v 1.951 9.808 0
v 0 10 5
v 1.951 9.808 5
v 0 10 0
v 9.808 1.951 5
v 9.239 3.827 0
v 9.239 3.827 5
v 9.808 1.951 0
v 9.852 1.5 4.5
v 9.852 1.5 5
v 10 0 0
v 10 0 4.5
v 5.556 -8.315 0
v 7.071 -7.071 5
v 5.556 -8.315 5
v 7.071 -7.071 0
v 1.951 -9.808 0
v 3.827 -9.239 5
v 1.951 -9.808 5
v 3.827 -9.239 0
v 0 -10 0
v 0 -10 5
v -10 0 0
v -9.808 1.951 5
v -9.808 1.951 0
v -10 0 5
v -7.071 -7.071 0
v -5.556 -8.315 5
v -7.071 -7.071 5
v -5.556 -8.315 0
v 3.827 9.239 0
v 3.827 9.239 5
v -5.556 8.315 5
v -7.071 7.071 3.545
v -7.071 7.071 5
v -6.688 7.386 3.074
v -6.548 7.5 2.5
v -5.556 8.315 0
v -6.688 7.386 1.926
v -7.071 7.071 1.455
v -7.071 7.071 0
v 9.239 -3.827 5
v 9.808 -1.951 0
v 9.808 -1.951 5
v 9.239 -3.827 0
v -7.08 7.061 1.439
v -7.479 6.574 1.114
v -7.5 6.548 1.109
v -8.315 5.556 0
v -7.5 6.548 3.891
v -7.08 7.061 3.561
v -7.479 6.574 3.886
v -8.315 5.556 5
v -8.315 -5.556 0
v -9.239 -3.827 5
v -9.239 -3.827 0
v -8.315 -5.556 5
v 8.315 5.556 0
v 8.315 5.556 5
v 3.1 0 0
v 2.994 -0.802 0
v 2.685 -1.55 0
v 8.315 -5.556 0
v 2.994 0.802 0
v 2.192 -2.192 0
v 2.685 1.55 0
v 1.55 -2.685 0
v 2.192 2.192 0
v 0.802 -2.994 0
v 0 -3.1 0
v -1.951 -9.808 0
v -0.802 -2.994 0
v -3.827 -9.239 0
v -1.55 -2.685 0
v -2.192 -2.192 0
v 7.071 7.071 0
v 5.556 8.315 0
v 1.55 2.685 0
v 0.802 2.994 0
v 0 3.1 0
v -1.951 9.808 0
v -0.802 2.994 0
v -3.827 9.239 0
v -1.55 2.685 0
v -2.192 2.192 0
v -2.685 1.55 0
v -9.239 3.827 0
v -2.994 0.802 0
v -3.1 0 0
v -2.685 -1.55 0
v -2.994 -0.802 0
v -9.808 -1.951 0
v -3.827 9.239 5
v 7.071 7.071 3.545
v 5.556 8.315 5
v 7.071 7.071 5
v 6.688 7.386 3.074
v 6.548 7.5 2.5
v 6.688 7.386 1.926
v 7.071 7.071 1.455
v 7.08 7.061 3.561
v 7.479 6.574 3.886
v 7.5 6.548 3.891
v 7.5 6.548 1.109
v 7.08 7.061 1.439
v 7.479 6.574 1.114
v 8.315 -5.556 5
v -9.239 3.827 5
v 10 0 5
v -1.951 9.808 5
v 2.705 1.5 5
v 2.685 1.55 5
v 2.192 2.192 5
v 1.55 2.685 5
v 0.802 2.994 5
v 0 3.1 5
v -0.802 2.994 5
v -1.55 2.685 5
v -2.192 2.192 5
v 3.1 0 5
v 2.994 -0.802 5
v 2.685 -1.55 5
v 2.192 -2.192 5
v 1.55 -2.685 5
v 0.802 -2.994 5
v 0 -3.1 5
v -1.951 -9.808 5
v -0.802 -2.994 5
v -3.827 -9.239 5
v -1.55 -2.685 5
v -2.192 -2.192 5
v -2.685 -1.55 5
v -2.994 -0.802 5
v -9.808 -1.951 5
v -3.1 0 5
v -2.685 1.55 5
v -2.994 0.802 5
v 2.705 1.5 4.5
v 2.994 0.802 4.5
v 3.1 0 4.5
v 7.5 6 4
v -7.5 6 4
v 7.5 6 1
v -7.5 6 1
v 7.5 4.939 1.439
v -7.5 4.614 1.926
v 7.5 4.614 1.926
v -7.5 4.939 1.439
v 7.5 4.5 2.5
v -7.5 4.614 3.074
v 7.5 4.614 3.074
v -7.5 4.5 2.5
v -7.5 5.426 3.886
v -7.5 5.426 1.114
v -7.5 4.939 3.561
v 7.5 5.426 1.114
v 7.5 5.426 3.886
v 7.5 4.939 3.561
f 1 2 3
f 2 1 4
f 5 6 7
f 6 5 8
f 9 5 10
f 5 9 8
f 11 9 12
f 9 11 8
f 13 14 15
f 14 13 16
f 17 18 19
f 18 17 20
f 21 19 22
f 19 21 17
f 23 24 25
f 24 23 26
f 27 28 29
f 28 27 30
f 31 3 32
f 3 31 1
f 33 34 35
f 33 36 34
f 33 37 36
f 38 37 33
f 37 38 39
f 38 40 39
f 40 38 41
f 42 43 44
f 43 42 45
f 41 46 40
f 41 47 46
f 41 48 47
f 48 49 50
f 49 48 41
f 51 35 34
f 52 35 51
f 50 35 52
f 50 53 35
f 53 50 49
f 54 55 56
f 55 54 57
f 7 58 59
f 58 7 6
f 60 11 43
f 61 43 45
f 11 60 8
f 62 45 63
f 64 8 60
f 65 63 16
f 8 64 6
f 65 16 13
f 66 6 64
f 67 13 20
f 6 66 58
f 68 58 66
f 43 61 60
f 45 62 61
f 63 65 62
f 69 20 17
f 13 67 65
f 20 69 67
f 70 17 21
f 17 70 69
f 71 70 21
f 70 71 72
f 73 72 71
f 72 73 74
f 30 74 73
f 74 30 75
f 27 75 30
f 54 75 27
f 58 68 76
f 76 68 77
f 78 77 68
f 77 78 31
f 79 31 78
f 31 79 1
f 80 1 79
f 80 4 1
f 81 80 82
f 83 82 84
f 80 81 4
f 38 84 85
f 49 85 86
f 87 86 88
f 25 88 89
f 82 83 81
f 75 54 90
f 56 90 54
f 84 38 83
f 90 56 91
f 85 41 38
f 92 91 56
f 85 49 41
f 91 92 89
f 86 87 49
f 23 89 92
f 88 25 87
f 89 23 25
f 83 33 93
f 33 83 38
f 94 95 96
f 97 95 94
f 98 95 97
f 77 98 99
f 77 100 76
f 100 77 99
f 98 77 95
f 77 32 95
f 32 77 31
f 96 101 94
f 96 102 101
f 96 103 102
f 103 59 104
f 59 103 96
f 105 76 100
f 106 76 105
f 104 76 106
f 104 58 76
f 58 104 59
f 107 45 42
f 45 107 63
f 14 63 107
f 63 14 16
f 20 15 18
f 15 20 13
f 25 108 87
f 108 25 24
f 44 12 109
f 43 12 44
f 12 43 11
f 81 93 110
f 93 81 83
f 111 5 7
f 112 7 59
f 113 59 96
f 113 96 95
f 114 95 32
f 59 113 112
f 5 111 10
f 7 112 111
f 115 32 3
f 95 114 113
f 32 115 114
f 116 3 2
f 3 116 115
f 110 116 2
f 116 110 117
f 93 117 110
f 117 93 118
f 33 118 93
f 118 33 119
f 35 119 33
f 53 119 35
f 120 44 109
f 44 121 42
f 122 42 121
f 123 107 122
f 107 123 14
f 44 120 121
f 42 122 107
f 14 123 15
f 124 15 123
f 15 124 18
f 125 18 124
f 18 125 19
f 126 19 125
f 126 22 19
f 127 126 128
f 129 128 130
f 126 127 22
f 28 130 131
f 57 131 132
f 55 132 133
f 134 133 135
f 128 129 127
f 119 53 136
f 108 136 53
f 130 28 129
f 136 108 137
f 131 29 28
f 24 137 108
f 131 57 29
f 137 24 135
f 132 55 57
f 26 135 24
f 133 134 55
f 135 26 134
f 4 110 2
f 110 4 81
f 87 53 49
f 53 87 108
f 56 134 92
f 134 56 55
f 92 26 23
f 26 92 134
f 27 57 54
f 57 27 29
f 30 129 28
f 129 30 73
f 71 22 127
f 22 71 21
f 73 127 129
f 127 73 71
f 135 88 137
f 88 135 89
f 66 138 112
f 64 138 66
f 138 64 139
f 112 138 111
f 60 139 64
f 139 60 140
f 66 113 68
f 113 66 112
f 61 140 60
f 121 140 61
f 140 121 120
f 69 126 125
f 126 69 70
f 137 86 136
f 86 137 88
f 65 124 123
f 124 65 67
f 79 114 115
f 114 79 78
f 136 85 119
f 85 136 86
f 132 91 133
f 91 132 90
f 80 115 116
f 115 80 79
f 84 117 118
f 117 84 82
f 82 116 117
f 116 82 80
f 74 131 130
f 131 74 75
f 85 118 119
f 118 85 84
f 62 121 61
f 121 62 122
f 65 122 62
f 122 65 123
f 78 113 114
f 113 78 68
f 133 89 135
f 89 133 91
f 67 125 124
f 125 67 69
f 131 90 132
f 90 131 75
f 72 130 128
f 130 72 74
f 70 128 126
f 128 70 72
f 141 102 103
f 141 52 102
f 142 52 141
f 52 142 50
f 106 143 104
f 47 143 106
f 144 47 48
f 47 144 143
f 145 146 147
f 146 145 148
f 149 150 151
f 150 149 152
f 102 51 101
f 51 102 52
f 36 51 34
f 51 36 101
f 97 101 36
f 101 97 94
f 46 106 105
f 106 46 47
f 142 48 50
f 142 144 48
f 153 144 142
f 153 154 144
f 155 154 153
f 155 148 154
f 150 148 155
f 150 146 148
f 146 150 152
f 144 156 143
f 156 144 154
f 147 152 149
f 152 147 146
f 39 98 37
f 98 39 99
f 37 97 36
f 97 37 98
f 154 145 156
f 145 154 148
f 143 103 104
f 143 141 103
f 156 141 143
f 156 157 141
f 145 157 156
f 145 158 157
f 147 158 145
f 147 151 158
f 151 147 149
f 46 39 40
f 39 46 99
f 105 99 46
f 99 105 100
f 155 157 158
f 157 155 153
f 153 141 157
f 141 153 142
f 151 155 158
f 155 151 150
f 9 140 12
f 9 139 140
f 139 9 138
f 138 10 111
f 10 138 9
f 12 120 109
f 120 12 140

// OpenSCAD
// Simple Cam-Lock Sliding Lid Box for MG996R Servo
// SafeCrackerArduino Reaction Time Game
// No gravity assist - pure cam mechanism

// MG996R dimensions
servo_length = 40;
servo_width = 20;
servo_height = 40.5;
servo_mount_width = 55;

// Box parameters
wall = 2.5;
clearance = 0.5;
base_thickness = 3;
size_increase = 1.1; // 10% increase factor

// Sliding mechanism
slide_groove_depth = 2;
slide_groove_width = 3;
lid_thickness = 3;

// Cam parameters - REDUCED SIZE
cam_diameter = 20;        // Reduced from 30 to 20mm
cam_thickness = 5;
cam_flat_width = 12;      // Reduced flat width proportionally

// Calculate box dimensions with 10% increase
box_inner_l = (servo_length + 2 * clearance) * size_increase;
box_inner_w = (servo_mount_width + 2 * clearance) * size_increase;
box_inner_h = (servo_height + clearance) * size_increase;
box_outer_l = box_inner_l + 2 * wall;
box_outer_w = box_inner_w + 2 * wall;
box_outer_h = box_inner_h + base_thickness;

// Main box - NO SERVO MOUNTS
module box() {
    difference() {
        // Outer shell
        cube([box_outer_l, box_outer_w, box_outer_h]);
        
        // Inner cavity - clean empty space for servo
        translate([wall, wall, base_thickness])
            cube([box_inner_l, box_inner_w, box_inner_h + 10]);
        
        // Servo shaft hole - large for easy assembly
        translate([box_outer_l/2, box_outer_w/2, -1])
            cylinder(h=base_thickness + 2, d=12, $fn=24);
        
        // Cable exit
        translate([box_outer_l - wall - 1, box_outer_w/2 - 5, base_thickness + 15])
            cube([wall + 2, 10, 10]);
        
        // Slide grooves for lid
        groove_height = box_outer_h - 8;
        // Left groove
        translate([-1, wall - slide_groove_width/2, groove_height])
            cube([box_outer_l + 2, slide_groove_width, slide_groove_depth + 1]);
        // Right groove
        translate([-1, box_outer_w - wall - slide_groove_width/2, groove_height])
            cube([box_outer_l + 2, slide_groove_width, slide_groove_depth + 1]);
        
        // Front opening for lid
        translate([-1, wall - slide_groove_width/2, groove_height])
            cube([wall + 2, box_inner_w + slide_groove_width + 1, 10]);
        
        // Mounting holes
        for(x=[8, box_outer_l - 8]) {
            for(y=[8, box_outer_w - 8]) {
                translate([x, y, -1]) {
                    cylinder(h=base_thickness + 2, d=3.2, $fn=16);
                    // Countersink
                    cylinder(h=2, d1=6, d2=3.2, $fn=16);
                }
            }
        }
    }
    
    // NO SERVO MOUNTS - servo sits freely in cavity
}

// Simple sliding lid
module sliding_lid() {
    lid_length = box_outer_l - wall - 0.5;
    lid_width = box_inner_w - 0.5;
    
    difference() {
        union() {
            // Main lid panel
            cube([lid_length, lid_width, lid_thickness]);
            
            // Slide rails
            rail_thickness = slide_groove_width - 0.3;
            rail_height = slide_groove_depth - 0.2;
            
            // Left rail
            translate([0, -rail_thickness/2 + 0.1, lid_thickness])
                cube([lid_length - 5, rail_thickness, rail_height]);
            // Right rail
            translate([0, lid_width - rail_thickness/2 - 0.1, lid_thickness])
                cube([lid_length - 5, rail_thickness, rail_height]);
            
            // Pull handle
            translate([lid_length - 15, lid_width/2 - 10, 0])
                hull() {
                    cube([10, 20, lid_thickness]);
                    translate([5, 10, lid_thickness])
                        cylinder(h=2, d=15, $fn=24);
                }
            
            // Cam follower block at front - REDUCED HEIGHT
            translate([0, lid_width/2 - 6, 0])  // Reduced from 8 to 6
                cube([5, 12, lid_thickness + 6]);  // Reduced width and height
        }
        
        // Cam contact surface (rounded for smooth operation) - ADJUSTED
        translate([2.5, lid_width/2, lid_thickness + 3])  // Lowered contact point
            rotate([0, 90, 0])
                cylinder(h=6, d=6, $fn=16, center=true);  // Smaller contact surface
        
        // Status window
        translate([lid_length/2 - 15, lid_width/2 - 4, -1])
            cube([30, 8, lid_thickness + 2]);
        
        // Text
        translate([lid_length/2, lid_width/2, lid_thickness - 0.5])
            linear_extrude(height=1)
                text("LOCKED", size=5, halign="center", valign="center");
    }
}

// Smaller D-shaped cam
module simple_cam() {
    difference() {
        // Main cam shape - SMALLER
        intersection() {
            cylinder(h=cam_thickness, d=cam_diameter, $fn=32);
            translate([-cam_diameter/2, -cam_diameter/2, 0])
                cube([cam_diameter, cam_diameter - cam_flat_width/2 + cam_diameter/2, cam_thickness]);
        }
        
        // Center hole for servo shaft
        translate([0, 0, -1])
            cylinder(h=cam_thickness + 2, d=6.2, $fn=24);
        
        // Set screw hole - ADJUSTED for smaller cam
        translate([0, 6, cam_thickness/2])  // Moved closer to center
            rotate([0, 90, 0])
                cylinder(h=15, d=3, $fn=16, center=true);
        
        // Position marker line for assembly reference
        translate([-1, 0, cam_thickness - 0.5])
            cube([cam_diameter/2 + 1, 1.5, 0.5]);  // Smaller marker
    }
}

// Assembly view
// Box (no servo mounts)
//box();

// Lid (shown separately for printing)
//translate([0, box_outer_w + 10, 0])
  //  sliding_lid();

// Cam (shown separately) - smaller size
//translate([box_outer_l + 20, 20, 0])
    simple_cam();

// Assembly instructions
echo("=== ASSEMBLY INSTRUCTIONS ===");
echo("1. Drop servo into box cavity (no mounts blocking)");
echo("2. Slide lid in from front (cam follower faces inward)");
echo("3. Attach smaller cam to servo shaft with flat edge at 0°");
echo("4. Cam at 0-30°: Flat blocks lid (LOCKED)");
echo("5. Cam at 90-180°: Round edge allows sliding (UNLOCKED)");
echo("Print time: ~2.5 hours total at 0.2mm layers");
echo("Servo mounts removed - clean cavity for easy insertion");
echo("Cam size reduced from 30mm to 20mm diameter");
